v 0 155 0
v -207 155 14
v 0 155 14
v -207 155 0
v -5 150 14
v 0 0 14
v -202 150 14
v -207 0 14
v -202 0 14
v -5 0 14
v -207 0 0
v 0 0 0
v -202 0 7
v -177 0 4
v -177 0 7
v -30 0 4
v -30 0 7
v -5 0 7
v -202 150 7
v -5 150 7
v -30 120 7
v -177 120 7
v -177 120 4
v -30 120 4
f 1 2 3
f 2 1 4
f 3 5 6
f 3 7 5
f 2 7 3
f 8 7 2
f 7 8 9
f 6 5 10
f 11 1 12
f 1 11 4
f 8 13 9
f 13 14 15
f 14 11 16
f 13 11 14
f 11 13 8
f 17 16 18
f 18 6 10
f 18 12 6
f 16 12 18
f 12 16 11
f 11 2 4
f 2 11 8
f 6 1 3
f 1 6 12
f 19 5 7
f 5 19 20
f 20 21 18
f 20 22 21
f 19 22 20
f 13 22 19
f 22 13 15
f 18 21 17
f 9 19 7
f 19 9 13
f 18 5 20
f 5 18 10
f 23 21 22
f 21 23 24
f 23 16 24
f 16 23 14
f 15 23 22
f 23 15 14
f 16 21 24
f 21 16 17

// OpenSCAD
module sidePiece() {
    difference() {
        cube([155,207,14]);
        translate([-1, 5, 7]) cube([151,197,8]);
        translate([-1, 30, 4]) cube([121, 147, 11]);
    }
}

module centerPiece() {
    difference() {
        cube([150,207,14]);
        translate([-1, 5, 7]) cube([152,197,8]);
        translate([-1, 30, 4]) cube([152, 147, 11]);
    }
}

// rotate because Cura Ultimaker prints vertically - too close to wipe
rotate(90, [0, 0, 1])
sidePiece();
